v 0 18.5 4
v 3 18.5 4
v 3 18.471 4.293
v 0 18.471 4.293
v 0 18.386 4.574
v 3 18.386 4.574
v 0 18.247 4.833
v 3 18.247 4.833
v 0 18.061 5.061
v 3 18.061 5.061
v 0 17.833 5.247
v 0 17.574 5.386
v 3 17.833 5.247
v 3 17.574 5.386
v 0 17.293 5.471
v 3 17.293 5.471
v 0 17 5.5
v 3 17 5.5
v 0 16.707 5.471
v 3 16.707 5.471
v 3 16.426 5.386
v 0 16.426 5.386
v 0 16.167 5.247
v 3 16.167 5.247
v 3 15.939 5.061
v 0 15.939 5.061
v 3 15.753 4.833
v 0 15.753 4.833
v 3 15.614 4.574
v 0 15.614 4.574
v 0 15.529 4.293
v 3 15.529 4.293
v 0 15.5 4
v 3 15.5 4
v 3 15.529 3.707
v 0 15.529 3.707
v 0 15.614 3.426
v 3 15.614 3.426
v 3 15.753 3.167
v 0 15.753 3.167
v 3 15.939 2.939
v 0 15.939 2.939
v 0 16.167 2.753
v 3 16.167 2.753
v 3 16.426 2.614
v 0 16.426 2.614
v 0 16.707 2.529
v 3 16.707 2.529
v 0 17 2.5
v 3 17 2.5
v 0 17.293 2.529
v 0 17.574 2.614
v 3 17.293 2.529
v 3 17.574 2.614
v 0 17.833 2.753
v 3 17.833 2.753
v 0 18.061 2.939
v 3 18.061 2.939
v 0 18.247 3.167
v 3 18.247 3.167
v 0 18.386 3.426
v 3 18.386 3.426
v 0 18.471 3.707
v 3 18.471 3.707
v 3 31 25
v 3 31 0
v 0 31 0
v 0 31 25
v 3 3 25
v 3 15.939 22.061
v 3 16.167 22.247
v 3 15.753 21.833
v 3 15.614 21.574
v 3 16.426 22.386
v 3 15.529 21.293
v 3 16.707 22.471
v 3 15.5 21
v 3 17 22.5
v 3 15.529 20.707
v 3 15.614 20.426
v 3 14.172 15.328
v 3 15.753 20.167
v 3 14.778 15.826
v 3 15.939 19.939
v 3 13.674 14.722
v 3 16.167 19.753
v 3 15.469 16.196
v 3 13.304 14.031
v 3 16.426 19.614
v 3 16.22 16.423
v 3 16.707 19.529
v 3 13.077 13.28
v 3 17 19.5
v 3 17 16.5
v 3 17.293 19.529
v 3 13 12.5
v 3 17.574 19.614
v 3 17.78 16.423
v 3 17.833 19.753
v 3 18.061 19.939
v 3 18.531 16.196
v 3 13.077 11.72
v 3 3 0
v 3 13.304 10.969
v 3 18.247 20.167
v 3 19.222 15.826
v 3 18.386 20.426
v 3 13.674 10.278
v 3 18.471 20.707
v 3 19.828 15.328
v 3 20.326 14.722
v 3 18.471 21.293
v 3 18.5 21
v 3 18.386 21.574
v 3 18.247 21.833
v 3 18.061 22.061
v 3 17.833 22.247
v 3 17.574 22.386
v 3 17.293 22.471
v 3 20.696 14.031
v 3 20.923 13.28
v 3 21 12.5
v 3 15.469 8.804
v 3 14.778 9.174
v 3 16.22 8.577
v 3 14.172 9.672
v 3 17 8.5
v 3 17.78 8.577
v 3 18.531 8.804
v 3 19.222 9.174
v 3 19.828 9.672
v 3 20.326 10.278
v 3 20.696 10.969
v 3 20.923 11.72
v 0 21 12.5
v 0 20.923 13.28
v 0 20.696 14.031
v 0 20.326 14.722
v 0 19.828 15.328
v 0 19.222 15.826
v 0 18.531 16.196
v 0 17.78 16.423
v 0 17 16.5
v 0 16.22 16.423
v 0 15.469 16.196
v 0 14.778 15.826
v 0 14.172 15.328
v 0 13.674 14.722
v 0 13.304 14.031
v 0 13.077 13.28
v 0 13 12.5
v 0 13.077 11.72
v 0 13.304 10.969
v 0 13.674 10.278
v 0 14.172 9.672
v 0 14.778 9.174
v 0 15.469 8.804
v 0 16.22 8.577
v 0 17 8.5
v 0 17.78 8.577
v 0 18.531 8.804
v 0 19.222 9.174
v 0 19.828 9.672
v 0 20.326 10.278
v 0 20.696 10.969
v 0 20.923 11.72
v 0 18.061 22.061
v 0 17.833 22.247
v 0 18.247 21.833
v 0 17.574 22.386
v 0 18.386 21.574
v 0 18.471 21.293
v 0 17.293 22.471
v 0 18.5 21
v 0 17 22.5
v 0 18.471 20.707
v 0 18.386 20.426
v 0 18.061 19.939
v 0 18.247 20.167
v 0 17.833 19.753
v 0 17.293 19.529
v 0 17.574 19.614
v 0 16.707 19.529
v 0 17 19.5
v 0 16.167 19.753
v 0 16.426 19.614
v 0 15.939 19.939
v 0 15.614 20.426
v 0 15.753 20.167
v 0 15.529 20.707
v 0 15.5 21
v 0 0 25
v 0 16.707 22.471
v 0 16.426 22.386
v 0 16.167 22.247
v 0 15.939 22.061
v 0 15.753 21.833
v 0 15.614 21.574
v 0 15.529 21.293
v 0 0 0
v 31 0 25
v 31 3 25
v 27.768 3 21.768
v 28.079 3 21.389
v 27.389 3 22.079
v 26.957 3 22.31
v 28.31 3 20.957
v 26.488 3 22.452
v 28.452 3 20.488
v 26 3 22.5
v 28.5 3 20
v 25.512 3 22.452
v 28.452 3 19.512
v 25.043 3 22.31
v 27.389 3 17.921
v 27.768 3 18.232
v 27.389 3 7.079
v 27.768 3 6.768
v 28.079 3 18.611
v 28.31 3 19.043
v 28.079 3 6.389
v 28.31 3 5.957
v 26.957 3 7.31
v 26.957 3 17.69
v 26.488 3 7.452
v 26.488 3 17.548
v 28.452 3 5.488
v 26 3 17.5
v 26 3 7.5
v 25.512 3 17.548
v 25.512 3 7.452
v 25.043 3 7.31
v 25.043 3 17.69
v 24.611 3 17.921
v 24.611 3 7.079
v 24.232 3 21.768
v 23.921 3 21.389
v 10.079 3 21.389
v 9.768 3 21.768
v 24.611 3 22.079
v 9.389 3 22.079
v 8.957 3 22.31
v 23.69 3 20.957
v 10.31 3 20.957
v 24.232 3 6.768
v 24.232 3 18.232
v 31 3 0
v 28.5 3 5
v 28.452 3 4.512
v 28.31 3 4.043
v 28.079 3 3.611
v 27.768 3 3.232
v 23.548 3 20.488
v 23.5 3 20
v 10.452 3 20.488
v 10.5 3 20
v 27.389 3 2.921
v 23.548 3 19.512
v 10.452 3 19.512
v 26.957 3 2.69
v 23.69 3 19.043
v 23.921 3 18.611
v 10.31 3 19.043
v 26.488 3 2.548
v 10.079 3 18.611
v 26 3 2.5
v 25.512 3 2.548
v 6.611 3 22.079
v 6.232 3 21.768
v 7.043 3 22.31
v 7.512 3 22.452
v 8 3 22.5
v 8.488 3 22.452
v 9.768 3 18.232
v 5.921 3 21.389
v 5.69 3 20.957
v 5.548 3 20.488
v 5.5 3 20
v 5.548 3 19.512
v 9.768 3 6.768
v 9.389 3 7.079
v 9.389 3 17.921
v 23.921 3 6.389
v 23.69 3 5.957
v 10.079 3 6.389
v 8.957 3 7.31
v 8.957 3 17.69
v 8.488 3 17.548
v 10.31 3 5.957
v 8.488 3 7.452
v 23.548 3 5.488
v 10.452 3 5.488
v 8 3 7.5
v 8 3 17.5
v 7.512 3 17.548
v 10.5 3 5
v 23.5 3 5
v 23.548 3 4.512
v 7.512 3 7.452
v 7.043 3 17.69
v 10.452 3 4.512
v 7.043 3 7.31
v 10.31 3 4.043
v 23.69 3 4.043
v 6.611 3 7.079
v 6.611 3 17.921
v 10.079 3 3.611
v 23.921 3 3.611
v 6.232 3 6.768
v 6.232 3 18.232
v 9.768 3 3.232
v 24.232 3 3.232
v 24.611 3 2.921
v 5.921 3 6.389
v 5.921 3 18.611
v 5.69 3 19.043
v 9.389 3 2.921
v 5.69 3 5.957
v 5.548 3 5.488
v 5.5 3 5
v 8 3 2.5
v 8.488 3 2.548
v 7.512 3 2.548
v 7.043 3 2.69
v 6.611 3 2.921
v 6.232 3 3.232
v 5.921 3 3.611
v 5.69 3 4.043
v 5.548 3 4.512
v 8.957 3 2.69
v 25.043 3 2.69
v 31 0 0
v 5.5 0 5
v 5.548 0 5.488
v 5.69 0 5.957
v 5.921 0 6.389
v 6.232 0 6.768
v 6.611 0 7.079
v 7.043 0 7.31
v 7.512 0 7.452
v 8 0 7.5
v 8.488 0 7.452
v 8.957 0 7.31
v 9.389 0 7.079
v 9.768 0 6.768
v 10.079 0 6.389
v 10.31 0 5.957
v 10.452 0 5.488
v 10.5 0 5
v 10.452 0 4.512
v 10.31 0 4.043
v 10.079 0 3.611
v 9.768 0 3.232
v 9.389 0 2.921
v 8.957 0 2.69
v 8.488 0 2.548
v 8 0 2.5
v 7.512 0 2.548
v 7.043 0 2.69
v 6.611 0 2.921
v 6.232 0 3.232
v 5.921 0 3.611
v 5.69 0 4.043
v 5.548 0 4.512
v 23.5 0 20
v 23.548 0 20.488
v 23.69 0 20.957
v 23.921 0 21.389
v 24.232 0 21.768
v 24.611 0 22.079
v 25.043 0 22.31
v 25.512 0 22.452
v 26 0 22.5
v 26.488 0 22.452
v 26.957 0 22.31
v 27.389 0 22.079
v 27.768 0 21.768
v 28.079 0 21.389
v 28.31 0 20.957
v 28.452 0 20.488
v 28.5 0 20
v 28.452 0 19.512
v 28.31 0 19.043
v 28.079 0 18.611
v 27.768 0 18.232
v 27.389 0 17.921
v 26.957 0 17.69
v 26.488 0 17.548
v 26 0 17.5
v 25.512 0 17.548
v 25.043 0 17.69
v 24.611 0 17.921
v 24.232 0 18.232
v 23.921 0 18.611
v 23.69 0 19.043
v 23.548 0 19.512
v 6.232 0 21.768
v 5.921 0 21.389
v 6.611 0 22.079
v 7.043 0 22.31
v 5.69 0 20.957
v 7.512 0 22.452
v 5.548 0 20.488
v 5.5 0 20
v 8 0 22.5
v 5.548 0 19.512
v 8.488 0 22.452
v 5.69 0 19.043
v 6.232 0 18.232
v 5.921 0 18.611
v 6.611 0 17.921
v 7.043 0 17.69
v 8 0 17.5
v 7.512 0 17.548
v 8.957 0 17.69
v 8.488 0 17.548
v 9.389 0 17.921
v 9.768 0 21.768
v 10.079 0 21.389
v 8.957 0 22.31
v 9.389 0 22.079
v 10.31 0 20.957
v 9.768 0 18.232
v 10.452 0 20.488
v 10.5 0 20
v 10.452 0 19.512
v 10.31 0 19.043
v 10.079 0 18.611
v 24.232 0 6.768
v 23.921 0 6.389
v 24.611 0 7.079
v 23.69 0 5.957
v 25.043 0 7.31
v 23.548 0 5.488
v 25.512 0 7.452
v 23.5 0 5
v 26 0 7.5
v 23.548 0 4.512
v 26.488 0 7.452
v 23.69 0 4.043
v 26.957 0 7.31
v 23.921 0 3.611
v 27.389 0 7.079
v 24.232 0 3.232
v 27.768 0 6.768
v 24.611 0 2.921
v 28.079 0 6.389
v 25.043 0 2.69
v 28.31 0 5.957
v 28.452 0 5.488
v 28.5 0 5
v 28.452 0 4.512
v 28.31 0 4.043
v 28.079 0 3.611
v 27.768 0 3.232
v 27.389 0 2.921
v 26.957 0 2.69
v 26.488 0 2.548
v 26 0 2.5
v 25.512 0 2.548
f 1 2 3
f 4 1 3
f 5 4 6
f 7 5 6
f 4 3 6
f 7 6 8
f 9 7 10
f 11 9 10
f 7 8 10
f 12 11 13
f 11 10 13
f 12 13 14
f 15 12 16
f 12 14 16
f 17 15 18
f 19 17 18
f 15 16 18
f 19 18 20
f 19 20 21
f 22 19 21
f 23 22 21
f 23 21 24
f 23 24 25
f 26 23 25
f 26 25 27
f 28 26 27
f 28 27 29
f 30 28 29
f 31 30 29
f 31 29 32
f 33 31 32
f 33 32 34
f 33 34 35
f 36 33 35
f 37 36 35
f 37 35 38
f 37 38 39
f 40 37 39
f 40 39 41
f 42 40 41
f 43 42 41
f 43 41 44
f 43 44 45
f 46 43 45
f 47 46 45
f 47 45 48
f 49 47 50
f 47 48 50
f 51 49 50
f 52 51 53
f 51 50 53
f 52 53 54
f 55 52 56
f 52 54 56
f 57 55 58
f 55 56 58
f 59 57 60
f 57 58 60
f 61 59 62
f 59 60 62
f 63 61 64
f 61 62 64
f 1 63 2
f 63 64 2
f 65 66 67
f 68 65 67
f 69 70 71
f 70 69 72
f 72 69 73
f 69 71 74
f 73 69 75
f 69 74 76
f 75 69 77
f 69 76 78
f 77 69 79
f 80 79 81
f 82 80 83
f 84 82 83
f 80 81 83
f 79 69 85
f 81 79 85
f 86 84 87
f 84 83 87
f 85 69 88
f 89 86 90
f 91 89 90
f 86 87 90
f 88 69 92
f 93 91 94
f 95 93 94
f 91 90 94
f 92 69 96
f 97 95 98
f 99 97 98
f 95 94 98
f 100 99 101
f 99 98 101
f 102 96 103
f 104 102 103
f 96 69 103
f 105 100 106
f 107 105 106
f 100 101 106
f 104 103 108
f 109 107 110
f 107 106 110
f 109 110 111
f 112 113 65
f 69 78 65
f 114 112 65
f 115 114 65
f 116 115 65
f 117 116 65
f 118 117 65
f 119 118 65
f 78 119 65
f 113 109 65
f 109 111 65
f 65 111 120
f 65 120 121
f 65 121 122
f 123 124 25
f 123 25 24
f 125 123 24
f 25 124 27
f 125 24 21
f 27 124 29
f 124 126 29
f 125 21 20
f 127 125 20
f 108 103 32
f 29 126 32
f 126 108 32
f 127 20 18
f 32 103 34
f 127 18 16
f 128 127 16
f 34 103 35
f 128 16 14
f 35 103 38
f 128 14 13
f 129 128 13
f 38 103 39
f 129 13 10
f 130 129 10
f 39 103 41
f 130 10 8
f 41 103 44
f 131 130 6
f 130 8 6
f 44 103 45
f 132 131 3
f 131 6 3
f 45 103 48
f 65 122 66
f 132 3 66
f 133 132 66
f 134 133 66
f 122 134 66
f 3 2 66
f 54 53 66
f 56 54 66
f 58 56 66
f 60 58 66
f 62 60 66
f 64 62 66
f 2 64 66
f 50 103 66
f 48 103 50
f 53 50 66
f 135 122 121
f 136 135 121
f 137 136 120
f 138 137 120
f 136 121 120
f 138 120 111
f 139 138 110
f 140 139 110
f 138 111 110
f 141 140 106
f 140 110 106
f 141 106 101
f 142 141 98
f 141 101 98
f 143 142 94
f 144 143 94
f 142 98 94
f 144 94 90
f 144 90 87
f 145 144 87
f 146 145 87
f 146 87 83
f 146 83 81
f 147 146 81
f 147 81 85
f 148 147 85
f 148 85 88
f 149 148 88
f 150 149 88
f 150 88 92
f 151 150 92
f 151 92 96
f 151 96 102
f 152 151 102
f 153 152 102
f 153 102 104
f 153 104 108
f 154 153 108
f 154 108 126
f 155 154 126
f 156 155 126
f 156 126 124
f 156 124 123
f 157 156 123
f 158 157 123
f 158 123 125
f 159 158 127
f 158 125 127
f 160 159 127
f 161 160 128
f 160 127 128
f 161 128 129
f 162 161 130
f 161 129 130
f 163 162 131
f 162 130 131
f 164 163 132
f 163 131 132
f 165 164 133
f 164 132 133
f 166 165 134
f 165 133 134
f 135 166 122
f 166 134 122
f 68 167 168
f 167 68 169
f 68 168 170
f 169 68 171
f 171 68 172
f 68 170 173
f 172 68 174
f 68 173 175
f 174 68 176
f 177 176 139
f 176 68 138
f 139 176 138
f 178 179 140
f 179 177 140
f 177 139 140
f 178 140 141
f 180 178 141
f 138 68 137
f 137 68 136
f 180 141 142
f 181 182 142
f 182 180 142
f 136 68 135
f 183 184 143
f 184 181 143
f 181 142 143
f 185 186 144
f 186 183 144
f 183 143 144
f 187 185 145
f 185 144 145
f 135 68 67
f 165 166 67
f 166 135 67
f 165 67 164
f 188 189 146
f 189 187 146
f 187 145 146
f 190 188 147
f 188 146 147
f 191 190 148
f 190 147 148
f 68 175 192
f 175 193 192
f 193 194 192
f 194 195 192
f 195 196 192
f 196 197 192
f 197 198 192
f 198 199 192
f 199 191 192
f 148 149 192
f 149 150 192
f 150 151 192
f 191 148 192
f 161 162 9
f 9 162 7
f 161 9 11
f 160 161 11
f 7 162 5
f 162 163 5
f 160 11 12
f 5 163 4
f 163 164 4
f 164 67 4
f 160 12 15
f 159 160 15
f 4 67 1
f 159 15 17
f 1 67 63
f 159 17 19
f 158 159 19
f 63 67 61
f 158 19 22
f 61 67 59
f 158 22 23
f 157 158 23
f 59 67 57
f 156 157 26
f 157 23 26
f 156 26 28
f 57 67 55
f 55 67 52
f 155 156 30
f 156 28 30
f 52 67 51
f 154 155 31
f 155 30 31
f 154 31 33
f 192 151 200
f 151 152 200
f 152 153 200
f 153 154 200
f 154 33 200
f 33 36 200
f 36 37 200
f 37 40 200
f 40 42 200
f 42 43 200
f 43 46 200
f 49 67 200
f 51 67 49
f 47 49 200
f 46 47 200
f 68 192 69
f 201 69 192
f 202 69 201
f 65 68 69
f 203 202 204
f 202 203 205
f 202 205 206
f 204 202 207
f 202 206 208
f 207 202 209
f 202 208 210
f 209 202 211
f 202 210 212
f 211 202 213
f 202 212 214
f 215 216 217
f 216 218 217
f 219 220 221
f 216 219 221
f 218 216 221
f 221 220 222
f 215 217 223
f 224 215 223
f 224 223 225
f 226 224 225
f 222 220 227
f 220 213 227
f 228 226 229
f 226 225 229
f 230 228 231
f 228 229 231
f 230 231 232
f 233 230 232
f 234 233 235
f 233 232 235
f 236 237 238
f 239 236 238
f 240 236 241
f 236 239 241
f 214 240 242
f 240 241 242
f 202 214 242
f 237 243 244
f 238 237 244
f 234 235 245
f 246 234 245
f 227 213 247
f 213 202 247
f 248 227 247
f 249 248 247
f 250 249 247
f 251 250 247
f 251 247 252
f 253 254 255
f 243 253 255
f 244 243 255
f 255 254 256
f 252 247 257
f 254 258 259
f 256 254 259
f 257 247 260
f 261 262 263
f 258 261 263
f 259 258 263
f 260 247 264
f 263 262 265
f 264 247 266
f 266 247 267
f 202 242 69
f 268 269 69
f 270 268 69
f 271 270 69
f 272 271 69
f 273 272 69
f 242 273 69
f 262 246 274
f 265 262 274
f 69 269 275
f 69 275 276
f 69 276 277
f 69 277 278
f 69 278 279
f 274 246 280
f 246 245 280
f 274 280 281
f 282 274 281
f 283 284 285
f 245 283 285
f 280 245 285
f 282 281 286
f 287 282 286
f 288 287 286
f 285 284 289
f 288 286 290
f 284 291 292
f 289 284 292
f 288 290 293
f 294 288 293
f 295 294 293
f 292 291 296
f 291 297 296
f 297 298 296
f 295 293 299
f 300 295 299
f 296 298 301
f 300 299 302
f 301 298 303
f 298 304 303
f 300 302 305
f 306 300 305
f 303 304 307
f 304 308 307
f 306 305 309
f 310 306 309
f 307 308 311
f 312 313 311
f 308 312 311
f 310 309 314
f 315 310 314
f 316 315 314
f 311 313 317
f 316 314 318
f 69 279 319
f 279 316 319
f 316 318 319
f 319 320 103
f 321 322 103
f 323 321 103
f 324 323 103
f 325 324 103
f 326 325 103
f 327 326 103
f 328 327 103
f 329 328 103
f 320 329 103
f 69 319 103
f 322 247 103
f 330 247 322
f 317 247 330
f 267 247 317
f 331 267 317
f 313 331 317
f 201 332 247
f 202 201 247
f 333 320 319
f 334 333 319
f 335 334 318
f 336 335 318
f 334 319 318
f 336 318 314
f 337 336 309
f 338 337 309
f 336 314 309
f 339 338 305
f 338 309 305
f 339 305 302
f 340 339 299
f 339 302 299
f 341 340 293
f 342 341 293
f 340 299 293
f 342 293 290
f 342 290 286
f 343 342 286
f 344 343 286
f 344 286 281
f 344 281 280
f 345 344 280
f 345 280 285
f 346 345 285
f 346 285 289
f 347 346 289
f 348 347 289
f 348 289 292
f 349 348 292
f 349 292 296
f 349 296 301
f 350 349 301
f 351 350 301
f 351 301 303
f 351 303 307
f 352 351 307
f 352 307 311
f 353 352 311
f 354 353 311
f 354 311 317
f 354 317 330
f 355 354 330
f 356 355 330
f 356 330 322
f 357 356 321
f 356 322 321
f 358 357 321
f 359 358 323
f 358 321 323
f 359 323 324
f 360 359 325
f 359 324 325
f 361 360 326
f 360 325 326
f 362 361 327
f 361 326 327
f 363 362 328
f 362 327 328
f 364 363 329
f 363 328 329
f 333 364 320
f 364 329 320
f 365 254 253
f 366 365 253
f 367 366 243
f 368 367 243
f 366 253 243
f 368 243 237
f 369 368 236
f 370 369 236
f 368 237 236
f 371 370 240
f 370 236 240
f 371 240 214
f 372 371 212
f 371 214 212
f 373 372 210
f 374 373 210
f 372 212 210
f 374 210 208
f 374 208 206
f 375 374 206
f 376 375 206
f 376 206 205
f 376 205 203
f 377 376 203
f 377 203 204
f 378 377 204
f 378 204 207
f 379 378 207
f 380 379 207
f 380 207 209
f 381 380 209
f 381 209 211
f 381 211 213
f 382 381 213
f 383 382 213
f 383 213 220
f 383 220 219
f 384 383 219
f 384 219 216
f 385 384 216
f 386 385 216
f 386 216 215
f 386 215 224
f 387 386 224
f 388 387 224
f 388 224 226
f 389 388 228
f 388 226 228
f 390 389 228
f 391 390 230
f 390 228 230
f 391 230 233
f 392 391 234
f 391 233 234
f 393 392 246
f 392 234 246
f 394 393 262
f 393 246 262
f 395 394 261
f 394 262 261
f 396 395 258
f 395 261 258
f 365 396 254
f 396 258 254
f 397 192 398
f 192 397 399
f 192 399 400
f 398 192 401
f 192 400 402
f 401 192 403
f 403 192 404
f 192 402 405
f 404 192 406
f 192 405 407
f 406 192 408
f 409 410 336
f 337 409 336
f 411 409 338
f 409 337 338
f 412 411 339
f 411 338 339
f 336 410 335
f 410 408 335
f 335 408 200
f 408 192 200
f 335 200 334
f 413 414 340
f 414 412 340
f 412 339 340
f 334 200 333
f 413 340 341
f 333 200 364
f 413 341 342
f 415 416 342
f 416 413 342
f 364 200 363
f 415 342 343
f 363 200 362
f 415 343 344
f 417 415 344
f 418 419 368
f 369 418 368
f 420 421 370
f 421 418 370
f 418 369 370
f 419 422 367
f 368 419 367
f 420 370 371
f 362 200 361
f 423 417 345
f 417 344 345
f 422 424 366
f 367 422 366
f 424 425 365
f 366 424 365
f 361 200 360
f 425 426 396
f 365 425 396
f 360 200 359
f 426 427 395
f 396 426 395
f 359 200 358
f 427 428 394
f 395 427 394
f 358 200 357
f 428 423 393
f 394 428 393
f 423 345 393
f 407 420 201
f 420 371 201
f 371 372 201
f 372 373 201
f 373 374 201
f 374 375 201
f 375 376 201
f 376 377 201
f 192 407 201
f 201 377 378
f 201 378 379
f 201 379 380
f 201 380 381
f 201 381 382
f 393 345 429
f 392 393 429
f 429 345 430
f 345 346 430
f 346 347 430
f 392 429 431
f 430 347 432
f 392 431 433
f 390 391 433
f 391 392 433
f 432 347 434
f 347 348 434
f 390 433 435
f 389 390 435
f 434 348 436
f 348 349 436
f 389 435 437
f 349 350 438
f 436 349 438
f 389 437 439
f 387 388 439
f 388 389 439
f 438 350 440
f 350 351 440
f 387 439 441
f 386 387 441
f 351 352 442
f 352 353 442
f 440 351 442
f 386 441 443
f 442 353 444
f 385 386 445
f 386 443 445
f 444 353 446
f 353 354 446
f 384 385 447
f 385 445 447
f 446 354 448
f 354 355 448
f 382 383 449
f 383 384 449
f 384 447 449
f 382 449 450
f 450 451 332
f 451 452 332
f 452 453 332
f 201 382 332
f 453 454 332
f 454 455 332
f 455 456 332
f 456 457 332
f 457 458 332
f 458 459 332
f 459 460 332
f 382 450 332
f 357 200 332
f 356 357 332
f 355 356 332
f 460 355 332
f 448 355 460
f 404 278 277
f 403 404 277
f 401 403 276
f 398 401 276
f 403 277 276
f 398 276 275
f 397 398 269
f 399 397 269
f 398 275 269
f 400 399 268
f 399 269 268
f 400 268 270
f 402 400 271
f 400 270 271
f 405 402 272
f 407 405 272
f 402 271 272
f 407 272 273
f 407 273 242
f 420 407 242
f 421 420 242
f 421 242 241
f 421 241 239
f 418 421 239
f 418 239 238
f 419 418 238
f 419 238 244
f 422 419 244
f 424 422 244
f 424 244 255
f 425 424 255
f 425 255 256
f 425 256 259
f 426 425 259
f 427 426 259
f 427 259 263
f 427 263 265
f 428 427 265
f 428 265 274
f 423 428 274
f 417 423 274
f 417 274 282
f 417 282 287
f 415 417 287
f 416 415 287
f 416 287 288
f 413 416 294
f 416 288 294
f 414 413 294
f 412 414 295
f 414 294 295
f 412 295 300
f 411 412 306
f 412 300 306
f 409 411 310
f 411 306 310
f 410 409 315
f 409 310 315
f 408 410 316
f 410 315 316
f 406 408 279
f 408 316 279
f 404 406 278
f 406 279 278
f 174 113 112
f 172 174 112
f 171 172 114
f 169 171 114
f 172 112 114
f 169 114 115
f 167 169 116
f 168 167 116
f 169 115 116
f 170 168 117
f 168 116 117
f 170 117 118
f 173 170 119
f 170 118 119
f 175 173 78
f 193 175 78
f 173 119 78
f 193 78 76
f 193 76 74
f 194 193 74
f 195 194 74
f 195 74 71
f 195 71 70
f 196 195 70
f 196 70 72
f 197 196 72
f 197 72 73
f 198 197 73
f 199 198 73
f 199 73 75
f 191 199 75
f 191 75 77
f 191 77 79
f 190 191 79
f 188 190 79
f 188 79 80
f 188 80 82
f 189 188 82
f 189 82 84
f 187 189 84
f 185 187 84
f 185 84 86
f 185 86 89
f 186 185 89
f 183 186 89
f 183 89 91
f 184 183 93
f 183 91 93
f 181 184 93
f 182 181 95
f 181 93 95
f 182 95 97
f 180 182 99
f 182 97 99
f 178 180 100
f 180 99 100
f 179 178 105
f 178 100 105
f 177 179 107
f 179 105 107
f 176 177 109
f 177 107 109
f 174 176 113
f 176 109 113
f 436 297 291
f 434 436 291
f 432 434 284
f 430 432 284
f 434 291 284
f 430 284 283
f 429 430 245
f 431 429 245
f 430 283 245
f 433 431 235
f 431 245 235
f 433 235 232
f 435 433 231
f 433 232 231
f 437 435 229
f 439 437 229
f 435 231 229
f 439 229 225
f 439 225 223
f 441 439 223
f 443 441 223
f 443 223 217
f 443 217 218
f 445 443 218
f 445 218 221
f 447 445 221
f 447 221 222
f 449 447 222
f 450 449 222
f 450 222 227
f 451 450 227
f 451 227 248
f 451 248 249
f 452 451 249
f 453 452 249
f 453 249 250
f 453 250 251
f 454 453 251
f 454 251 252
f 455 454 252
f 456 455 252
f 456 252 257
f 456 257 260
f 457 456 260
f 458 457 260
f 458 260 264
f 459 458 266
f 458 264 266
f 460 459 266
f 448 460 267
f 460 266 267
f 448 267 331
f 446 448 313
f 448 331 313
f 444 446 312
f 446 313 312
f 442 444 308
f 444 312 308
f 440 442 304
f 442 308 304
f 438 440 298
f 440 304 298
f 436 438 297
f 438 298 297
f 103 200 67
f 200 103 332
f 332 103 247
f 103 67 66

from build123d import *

# Parameters (mm, degrees)
BOSS_EXTRUDE1_DEPTH = 25
SKETCH2_R           = 1.5
SKETCH2_R_2         = 4
CUT_EXTRUDE1_DEPTH  = 49.682645779
CUT_EXTRUDE2_REACH  = 50.683
SKETCH3_R           = 2.5


with BuildPart() as part:
    # Sketch1 → Boss-Extrude1 (new body)
    with BuildSketch(Plane.XY):
        Polygon((0, 31), (0, 0), (31, 0), (31, 3), (3, 3), (3, 31), align=None)
    extrude(amount=BOSS_EXTRUDE1_DEPTH)

    # Sketch2 → Cut-Extrude1 (cut, through all)
    with BuildSketch(Plane(origin=(3, 0, 0), x_dir=(0, 0, -1), z_dir=(1, 0, 0))):
        with Locations(Location((-21, 17, 0), (0, 0, 90))):
            Circle(SKETCH2_R)
        with Locations(Location((-12.5, 17, 0), (0, 0, 90))):
            Circle(SKETCH2_R_2)
        with Locations(Location((-4, 17, 0), (0, 0, 90))):
            Circle(SKETCH2_R)
    extrude(amount=-CUT_EXTRUDE1_DEPTH, mode=Mode.SUBTRACT)

    # Sketch3 → Cut-Extrude2 (cut, up to next)
    with BuildSketch(Plane(origin=(0, 3, 0), x_dir=(1, 0, 0), z_dir=(0, 1, 0)), mode=Mode.PRIVATE) as cut_extrude2_sk1:
        with Locations(Location((8, -5, 0), (0, 0, 180))):
            Circle(SKETCH3_R)
    cut_extrude2_tool1 = extrude(cut_extrude2_sk1.sketch, amount=-CUT_EXTRUDE2_REACH, mode=Mode.PRIVATE) & part.part
    # Sketch3 → Cut-Extrude2 (cut, up to next)
    with BuildSketch(Plane(origin=(0, 3, 0), x_dir=(1, 0, 0), z_dir=(0, 1, 0)), mode=Mode.PRIVATE) as cut_extrude2_sk2:
        with Locations(Location((26, -5, 0), (0, 0, 180))):
            Circle(SKETCH3_R)
    cut_extrude2_tool2 = extrude(cut_extrude2_sk2.sketch, amount=-CUT_EXTRUDE2_REACH, mode=Mode.PRIVATE) & part.part
    # Sketch3 → Cut-Extrude2 (cut, up to next)
    with BuildSketch(Plane(origin=(0, 3, 0), x_dir=(1, 0, 0), z_dir=(0, 1, 0)), mode=Mode.PRIVATE) as cut_extrude2_sk3:
        with Locations(Location((26, -20, 0), (0, 0, 180))):
            Circle(SKETCH3_R)
    cut_extrude2_tool3 = extrude(cut_extrude2_sk3.sketch, amount=-CUT_EXTRUDE2_REACH, mode=Mode.PRIVATE) & part.part
    # Sketch3 → Cut-Extrude2 (cut, up to next)
    with BuildSketch(Plane(origin=(0, 3, 0), x_dir=(1, 0, 0), z_dir=(0, 1, 0)), mode=Mode.PRIVATE) as cut_extrude2_sk4:
        with Locations(Location((8, -20, 0), (0, 0, 180))):
            Circle(SKETCH3_R)
    cut_extrude2_tool4 = extrude(cut_extrude2_sk4.sketch, amount=-CUT_EXTRUDE2_REACH, mode=Mode.PRIVATE) & part.part
    add(cut_extrude2_tool1.solids().sort_by_distance((8, 3, 5))[0], mode=Mode.SUBTRACT)
    add(cut_extrude2_tool2.solids().sort_by_distance((26, 3, 5))[0], mode=Mode.SUBTRACT)
    add(cut_extrude2_tool3.solids().sort_by_distance((26, 3, 20))[0], mode=Mode.SUBTRACT)
    add(cut_extrude2_tool4.solids().sort_by_distance((8, 3, 20))[0], mode=Mode.SUBTRACT)


solid = part.part
